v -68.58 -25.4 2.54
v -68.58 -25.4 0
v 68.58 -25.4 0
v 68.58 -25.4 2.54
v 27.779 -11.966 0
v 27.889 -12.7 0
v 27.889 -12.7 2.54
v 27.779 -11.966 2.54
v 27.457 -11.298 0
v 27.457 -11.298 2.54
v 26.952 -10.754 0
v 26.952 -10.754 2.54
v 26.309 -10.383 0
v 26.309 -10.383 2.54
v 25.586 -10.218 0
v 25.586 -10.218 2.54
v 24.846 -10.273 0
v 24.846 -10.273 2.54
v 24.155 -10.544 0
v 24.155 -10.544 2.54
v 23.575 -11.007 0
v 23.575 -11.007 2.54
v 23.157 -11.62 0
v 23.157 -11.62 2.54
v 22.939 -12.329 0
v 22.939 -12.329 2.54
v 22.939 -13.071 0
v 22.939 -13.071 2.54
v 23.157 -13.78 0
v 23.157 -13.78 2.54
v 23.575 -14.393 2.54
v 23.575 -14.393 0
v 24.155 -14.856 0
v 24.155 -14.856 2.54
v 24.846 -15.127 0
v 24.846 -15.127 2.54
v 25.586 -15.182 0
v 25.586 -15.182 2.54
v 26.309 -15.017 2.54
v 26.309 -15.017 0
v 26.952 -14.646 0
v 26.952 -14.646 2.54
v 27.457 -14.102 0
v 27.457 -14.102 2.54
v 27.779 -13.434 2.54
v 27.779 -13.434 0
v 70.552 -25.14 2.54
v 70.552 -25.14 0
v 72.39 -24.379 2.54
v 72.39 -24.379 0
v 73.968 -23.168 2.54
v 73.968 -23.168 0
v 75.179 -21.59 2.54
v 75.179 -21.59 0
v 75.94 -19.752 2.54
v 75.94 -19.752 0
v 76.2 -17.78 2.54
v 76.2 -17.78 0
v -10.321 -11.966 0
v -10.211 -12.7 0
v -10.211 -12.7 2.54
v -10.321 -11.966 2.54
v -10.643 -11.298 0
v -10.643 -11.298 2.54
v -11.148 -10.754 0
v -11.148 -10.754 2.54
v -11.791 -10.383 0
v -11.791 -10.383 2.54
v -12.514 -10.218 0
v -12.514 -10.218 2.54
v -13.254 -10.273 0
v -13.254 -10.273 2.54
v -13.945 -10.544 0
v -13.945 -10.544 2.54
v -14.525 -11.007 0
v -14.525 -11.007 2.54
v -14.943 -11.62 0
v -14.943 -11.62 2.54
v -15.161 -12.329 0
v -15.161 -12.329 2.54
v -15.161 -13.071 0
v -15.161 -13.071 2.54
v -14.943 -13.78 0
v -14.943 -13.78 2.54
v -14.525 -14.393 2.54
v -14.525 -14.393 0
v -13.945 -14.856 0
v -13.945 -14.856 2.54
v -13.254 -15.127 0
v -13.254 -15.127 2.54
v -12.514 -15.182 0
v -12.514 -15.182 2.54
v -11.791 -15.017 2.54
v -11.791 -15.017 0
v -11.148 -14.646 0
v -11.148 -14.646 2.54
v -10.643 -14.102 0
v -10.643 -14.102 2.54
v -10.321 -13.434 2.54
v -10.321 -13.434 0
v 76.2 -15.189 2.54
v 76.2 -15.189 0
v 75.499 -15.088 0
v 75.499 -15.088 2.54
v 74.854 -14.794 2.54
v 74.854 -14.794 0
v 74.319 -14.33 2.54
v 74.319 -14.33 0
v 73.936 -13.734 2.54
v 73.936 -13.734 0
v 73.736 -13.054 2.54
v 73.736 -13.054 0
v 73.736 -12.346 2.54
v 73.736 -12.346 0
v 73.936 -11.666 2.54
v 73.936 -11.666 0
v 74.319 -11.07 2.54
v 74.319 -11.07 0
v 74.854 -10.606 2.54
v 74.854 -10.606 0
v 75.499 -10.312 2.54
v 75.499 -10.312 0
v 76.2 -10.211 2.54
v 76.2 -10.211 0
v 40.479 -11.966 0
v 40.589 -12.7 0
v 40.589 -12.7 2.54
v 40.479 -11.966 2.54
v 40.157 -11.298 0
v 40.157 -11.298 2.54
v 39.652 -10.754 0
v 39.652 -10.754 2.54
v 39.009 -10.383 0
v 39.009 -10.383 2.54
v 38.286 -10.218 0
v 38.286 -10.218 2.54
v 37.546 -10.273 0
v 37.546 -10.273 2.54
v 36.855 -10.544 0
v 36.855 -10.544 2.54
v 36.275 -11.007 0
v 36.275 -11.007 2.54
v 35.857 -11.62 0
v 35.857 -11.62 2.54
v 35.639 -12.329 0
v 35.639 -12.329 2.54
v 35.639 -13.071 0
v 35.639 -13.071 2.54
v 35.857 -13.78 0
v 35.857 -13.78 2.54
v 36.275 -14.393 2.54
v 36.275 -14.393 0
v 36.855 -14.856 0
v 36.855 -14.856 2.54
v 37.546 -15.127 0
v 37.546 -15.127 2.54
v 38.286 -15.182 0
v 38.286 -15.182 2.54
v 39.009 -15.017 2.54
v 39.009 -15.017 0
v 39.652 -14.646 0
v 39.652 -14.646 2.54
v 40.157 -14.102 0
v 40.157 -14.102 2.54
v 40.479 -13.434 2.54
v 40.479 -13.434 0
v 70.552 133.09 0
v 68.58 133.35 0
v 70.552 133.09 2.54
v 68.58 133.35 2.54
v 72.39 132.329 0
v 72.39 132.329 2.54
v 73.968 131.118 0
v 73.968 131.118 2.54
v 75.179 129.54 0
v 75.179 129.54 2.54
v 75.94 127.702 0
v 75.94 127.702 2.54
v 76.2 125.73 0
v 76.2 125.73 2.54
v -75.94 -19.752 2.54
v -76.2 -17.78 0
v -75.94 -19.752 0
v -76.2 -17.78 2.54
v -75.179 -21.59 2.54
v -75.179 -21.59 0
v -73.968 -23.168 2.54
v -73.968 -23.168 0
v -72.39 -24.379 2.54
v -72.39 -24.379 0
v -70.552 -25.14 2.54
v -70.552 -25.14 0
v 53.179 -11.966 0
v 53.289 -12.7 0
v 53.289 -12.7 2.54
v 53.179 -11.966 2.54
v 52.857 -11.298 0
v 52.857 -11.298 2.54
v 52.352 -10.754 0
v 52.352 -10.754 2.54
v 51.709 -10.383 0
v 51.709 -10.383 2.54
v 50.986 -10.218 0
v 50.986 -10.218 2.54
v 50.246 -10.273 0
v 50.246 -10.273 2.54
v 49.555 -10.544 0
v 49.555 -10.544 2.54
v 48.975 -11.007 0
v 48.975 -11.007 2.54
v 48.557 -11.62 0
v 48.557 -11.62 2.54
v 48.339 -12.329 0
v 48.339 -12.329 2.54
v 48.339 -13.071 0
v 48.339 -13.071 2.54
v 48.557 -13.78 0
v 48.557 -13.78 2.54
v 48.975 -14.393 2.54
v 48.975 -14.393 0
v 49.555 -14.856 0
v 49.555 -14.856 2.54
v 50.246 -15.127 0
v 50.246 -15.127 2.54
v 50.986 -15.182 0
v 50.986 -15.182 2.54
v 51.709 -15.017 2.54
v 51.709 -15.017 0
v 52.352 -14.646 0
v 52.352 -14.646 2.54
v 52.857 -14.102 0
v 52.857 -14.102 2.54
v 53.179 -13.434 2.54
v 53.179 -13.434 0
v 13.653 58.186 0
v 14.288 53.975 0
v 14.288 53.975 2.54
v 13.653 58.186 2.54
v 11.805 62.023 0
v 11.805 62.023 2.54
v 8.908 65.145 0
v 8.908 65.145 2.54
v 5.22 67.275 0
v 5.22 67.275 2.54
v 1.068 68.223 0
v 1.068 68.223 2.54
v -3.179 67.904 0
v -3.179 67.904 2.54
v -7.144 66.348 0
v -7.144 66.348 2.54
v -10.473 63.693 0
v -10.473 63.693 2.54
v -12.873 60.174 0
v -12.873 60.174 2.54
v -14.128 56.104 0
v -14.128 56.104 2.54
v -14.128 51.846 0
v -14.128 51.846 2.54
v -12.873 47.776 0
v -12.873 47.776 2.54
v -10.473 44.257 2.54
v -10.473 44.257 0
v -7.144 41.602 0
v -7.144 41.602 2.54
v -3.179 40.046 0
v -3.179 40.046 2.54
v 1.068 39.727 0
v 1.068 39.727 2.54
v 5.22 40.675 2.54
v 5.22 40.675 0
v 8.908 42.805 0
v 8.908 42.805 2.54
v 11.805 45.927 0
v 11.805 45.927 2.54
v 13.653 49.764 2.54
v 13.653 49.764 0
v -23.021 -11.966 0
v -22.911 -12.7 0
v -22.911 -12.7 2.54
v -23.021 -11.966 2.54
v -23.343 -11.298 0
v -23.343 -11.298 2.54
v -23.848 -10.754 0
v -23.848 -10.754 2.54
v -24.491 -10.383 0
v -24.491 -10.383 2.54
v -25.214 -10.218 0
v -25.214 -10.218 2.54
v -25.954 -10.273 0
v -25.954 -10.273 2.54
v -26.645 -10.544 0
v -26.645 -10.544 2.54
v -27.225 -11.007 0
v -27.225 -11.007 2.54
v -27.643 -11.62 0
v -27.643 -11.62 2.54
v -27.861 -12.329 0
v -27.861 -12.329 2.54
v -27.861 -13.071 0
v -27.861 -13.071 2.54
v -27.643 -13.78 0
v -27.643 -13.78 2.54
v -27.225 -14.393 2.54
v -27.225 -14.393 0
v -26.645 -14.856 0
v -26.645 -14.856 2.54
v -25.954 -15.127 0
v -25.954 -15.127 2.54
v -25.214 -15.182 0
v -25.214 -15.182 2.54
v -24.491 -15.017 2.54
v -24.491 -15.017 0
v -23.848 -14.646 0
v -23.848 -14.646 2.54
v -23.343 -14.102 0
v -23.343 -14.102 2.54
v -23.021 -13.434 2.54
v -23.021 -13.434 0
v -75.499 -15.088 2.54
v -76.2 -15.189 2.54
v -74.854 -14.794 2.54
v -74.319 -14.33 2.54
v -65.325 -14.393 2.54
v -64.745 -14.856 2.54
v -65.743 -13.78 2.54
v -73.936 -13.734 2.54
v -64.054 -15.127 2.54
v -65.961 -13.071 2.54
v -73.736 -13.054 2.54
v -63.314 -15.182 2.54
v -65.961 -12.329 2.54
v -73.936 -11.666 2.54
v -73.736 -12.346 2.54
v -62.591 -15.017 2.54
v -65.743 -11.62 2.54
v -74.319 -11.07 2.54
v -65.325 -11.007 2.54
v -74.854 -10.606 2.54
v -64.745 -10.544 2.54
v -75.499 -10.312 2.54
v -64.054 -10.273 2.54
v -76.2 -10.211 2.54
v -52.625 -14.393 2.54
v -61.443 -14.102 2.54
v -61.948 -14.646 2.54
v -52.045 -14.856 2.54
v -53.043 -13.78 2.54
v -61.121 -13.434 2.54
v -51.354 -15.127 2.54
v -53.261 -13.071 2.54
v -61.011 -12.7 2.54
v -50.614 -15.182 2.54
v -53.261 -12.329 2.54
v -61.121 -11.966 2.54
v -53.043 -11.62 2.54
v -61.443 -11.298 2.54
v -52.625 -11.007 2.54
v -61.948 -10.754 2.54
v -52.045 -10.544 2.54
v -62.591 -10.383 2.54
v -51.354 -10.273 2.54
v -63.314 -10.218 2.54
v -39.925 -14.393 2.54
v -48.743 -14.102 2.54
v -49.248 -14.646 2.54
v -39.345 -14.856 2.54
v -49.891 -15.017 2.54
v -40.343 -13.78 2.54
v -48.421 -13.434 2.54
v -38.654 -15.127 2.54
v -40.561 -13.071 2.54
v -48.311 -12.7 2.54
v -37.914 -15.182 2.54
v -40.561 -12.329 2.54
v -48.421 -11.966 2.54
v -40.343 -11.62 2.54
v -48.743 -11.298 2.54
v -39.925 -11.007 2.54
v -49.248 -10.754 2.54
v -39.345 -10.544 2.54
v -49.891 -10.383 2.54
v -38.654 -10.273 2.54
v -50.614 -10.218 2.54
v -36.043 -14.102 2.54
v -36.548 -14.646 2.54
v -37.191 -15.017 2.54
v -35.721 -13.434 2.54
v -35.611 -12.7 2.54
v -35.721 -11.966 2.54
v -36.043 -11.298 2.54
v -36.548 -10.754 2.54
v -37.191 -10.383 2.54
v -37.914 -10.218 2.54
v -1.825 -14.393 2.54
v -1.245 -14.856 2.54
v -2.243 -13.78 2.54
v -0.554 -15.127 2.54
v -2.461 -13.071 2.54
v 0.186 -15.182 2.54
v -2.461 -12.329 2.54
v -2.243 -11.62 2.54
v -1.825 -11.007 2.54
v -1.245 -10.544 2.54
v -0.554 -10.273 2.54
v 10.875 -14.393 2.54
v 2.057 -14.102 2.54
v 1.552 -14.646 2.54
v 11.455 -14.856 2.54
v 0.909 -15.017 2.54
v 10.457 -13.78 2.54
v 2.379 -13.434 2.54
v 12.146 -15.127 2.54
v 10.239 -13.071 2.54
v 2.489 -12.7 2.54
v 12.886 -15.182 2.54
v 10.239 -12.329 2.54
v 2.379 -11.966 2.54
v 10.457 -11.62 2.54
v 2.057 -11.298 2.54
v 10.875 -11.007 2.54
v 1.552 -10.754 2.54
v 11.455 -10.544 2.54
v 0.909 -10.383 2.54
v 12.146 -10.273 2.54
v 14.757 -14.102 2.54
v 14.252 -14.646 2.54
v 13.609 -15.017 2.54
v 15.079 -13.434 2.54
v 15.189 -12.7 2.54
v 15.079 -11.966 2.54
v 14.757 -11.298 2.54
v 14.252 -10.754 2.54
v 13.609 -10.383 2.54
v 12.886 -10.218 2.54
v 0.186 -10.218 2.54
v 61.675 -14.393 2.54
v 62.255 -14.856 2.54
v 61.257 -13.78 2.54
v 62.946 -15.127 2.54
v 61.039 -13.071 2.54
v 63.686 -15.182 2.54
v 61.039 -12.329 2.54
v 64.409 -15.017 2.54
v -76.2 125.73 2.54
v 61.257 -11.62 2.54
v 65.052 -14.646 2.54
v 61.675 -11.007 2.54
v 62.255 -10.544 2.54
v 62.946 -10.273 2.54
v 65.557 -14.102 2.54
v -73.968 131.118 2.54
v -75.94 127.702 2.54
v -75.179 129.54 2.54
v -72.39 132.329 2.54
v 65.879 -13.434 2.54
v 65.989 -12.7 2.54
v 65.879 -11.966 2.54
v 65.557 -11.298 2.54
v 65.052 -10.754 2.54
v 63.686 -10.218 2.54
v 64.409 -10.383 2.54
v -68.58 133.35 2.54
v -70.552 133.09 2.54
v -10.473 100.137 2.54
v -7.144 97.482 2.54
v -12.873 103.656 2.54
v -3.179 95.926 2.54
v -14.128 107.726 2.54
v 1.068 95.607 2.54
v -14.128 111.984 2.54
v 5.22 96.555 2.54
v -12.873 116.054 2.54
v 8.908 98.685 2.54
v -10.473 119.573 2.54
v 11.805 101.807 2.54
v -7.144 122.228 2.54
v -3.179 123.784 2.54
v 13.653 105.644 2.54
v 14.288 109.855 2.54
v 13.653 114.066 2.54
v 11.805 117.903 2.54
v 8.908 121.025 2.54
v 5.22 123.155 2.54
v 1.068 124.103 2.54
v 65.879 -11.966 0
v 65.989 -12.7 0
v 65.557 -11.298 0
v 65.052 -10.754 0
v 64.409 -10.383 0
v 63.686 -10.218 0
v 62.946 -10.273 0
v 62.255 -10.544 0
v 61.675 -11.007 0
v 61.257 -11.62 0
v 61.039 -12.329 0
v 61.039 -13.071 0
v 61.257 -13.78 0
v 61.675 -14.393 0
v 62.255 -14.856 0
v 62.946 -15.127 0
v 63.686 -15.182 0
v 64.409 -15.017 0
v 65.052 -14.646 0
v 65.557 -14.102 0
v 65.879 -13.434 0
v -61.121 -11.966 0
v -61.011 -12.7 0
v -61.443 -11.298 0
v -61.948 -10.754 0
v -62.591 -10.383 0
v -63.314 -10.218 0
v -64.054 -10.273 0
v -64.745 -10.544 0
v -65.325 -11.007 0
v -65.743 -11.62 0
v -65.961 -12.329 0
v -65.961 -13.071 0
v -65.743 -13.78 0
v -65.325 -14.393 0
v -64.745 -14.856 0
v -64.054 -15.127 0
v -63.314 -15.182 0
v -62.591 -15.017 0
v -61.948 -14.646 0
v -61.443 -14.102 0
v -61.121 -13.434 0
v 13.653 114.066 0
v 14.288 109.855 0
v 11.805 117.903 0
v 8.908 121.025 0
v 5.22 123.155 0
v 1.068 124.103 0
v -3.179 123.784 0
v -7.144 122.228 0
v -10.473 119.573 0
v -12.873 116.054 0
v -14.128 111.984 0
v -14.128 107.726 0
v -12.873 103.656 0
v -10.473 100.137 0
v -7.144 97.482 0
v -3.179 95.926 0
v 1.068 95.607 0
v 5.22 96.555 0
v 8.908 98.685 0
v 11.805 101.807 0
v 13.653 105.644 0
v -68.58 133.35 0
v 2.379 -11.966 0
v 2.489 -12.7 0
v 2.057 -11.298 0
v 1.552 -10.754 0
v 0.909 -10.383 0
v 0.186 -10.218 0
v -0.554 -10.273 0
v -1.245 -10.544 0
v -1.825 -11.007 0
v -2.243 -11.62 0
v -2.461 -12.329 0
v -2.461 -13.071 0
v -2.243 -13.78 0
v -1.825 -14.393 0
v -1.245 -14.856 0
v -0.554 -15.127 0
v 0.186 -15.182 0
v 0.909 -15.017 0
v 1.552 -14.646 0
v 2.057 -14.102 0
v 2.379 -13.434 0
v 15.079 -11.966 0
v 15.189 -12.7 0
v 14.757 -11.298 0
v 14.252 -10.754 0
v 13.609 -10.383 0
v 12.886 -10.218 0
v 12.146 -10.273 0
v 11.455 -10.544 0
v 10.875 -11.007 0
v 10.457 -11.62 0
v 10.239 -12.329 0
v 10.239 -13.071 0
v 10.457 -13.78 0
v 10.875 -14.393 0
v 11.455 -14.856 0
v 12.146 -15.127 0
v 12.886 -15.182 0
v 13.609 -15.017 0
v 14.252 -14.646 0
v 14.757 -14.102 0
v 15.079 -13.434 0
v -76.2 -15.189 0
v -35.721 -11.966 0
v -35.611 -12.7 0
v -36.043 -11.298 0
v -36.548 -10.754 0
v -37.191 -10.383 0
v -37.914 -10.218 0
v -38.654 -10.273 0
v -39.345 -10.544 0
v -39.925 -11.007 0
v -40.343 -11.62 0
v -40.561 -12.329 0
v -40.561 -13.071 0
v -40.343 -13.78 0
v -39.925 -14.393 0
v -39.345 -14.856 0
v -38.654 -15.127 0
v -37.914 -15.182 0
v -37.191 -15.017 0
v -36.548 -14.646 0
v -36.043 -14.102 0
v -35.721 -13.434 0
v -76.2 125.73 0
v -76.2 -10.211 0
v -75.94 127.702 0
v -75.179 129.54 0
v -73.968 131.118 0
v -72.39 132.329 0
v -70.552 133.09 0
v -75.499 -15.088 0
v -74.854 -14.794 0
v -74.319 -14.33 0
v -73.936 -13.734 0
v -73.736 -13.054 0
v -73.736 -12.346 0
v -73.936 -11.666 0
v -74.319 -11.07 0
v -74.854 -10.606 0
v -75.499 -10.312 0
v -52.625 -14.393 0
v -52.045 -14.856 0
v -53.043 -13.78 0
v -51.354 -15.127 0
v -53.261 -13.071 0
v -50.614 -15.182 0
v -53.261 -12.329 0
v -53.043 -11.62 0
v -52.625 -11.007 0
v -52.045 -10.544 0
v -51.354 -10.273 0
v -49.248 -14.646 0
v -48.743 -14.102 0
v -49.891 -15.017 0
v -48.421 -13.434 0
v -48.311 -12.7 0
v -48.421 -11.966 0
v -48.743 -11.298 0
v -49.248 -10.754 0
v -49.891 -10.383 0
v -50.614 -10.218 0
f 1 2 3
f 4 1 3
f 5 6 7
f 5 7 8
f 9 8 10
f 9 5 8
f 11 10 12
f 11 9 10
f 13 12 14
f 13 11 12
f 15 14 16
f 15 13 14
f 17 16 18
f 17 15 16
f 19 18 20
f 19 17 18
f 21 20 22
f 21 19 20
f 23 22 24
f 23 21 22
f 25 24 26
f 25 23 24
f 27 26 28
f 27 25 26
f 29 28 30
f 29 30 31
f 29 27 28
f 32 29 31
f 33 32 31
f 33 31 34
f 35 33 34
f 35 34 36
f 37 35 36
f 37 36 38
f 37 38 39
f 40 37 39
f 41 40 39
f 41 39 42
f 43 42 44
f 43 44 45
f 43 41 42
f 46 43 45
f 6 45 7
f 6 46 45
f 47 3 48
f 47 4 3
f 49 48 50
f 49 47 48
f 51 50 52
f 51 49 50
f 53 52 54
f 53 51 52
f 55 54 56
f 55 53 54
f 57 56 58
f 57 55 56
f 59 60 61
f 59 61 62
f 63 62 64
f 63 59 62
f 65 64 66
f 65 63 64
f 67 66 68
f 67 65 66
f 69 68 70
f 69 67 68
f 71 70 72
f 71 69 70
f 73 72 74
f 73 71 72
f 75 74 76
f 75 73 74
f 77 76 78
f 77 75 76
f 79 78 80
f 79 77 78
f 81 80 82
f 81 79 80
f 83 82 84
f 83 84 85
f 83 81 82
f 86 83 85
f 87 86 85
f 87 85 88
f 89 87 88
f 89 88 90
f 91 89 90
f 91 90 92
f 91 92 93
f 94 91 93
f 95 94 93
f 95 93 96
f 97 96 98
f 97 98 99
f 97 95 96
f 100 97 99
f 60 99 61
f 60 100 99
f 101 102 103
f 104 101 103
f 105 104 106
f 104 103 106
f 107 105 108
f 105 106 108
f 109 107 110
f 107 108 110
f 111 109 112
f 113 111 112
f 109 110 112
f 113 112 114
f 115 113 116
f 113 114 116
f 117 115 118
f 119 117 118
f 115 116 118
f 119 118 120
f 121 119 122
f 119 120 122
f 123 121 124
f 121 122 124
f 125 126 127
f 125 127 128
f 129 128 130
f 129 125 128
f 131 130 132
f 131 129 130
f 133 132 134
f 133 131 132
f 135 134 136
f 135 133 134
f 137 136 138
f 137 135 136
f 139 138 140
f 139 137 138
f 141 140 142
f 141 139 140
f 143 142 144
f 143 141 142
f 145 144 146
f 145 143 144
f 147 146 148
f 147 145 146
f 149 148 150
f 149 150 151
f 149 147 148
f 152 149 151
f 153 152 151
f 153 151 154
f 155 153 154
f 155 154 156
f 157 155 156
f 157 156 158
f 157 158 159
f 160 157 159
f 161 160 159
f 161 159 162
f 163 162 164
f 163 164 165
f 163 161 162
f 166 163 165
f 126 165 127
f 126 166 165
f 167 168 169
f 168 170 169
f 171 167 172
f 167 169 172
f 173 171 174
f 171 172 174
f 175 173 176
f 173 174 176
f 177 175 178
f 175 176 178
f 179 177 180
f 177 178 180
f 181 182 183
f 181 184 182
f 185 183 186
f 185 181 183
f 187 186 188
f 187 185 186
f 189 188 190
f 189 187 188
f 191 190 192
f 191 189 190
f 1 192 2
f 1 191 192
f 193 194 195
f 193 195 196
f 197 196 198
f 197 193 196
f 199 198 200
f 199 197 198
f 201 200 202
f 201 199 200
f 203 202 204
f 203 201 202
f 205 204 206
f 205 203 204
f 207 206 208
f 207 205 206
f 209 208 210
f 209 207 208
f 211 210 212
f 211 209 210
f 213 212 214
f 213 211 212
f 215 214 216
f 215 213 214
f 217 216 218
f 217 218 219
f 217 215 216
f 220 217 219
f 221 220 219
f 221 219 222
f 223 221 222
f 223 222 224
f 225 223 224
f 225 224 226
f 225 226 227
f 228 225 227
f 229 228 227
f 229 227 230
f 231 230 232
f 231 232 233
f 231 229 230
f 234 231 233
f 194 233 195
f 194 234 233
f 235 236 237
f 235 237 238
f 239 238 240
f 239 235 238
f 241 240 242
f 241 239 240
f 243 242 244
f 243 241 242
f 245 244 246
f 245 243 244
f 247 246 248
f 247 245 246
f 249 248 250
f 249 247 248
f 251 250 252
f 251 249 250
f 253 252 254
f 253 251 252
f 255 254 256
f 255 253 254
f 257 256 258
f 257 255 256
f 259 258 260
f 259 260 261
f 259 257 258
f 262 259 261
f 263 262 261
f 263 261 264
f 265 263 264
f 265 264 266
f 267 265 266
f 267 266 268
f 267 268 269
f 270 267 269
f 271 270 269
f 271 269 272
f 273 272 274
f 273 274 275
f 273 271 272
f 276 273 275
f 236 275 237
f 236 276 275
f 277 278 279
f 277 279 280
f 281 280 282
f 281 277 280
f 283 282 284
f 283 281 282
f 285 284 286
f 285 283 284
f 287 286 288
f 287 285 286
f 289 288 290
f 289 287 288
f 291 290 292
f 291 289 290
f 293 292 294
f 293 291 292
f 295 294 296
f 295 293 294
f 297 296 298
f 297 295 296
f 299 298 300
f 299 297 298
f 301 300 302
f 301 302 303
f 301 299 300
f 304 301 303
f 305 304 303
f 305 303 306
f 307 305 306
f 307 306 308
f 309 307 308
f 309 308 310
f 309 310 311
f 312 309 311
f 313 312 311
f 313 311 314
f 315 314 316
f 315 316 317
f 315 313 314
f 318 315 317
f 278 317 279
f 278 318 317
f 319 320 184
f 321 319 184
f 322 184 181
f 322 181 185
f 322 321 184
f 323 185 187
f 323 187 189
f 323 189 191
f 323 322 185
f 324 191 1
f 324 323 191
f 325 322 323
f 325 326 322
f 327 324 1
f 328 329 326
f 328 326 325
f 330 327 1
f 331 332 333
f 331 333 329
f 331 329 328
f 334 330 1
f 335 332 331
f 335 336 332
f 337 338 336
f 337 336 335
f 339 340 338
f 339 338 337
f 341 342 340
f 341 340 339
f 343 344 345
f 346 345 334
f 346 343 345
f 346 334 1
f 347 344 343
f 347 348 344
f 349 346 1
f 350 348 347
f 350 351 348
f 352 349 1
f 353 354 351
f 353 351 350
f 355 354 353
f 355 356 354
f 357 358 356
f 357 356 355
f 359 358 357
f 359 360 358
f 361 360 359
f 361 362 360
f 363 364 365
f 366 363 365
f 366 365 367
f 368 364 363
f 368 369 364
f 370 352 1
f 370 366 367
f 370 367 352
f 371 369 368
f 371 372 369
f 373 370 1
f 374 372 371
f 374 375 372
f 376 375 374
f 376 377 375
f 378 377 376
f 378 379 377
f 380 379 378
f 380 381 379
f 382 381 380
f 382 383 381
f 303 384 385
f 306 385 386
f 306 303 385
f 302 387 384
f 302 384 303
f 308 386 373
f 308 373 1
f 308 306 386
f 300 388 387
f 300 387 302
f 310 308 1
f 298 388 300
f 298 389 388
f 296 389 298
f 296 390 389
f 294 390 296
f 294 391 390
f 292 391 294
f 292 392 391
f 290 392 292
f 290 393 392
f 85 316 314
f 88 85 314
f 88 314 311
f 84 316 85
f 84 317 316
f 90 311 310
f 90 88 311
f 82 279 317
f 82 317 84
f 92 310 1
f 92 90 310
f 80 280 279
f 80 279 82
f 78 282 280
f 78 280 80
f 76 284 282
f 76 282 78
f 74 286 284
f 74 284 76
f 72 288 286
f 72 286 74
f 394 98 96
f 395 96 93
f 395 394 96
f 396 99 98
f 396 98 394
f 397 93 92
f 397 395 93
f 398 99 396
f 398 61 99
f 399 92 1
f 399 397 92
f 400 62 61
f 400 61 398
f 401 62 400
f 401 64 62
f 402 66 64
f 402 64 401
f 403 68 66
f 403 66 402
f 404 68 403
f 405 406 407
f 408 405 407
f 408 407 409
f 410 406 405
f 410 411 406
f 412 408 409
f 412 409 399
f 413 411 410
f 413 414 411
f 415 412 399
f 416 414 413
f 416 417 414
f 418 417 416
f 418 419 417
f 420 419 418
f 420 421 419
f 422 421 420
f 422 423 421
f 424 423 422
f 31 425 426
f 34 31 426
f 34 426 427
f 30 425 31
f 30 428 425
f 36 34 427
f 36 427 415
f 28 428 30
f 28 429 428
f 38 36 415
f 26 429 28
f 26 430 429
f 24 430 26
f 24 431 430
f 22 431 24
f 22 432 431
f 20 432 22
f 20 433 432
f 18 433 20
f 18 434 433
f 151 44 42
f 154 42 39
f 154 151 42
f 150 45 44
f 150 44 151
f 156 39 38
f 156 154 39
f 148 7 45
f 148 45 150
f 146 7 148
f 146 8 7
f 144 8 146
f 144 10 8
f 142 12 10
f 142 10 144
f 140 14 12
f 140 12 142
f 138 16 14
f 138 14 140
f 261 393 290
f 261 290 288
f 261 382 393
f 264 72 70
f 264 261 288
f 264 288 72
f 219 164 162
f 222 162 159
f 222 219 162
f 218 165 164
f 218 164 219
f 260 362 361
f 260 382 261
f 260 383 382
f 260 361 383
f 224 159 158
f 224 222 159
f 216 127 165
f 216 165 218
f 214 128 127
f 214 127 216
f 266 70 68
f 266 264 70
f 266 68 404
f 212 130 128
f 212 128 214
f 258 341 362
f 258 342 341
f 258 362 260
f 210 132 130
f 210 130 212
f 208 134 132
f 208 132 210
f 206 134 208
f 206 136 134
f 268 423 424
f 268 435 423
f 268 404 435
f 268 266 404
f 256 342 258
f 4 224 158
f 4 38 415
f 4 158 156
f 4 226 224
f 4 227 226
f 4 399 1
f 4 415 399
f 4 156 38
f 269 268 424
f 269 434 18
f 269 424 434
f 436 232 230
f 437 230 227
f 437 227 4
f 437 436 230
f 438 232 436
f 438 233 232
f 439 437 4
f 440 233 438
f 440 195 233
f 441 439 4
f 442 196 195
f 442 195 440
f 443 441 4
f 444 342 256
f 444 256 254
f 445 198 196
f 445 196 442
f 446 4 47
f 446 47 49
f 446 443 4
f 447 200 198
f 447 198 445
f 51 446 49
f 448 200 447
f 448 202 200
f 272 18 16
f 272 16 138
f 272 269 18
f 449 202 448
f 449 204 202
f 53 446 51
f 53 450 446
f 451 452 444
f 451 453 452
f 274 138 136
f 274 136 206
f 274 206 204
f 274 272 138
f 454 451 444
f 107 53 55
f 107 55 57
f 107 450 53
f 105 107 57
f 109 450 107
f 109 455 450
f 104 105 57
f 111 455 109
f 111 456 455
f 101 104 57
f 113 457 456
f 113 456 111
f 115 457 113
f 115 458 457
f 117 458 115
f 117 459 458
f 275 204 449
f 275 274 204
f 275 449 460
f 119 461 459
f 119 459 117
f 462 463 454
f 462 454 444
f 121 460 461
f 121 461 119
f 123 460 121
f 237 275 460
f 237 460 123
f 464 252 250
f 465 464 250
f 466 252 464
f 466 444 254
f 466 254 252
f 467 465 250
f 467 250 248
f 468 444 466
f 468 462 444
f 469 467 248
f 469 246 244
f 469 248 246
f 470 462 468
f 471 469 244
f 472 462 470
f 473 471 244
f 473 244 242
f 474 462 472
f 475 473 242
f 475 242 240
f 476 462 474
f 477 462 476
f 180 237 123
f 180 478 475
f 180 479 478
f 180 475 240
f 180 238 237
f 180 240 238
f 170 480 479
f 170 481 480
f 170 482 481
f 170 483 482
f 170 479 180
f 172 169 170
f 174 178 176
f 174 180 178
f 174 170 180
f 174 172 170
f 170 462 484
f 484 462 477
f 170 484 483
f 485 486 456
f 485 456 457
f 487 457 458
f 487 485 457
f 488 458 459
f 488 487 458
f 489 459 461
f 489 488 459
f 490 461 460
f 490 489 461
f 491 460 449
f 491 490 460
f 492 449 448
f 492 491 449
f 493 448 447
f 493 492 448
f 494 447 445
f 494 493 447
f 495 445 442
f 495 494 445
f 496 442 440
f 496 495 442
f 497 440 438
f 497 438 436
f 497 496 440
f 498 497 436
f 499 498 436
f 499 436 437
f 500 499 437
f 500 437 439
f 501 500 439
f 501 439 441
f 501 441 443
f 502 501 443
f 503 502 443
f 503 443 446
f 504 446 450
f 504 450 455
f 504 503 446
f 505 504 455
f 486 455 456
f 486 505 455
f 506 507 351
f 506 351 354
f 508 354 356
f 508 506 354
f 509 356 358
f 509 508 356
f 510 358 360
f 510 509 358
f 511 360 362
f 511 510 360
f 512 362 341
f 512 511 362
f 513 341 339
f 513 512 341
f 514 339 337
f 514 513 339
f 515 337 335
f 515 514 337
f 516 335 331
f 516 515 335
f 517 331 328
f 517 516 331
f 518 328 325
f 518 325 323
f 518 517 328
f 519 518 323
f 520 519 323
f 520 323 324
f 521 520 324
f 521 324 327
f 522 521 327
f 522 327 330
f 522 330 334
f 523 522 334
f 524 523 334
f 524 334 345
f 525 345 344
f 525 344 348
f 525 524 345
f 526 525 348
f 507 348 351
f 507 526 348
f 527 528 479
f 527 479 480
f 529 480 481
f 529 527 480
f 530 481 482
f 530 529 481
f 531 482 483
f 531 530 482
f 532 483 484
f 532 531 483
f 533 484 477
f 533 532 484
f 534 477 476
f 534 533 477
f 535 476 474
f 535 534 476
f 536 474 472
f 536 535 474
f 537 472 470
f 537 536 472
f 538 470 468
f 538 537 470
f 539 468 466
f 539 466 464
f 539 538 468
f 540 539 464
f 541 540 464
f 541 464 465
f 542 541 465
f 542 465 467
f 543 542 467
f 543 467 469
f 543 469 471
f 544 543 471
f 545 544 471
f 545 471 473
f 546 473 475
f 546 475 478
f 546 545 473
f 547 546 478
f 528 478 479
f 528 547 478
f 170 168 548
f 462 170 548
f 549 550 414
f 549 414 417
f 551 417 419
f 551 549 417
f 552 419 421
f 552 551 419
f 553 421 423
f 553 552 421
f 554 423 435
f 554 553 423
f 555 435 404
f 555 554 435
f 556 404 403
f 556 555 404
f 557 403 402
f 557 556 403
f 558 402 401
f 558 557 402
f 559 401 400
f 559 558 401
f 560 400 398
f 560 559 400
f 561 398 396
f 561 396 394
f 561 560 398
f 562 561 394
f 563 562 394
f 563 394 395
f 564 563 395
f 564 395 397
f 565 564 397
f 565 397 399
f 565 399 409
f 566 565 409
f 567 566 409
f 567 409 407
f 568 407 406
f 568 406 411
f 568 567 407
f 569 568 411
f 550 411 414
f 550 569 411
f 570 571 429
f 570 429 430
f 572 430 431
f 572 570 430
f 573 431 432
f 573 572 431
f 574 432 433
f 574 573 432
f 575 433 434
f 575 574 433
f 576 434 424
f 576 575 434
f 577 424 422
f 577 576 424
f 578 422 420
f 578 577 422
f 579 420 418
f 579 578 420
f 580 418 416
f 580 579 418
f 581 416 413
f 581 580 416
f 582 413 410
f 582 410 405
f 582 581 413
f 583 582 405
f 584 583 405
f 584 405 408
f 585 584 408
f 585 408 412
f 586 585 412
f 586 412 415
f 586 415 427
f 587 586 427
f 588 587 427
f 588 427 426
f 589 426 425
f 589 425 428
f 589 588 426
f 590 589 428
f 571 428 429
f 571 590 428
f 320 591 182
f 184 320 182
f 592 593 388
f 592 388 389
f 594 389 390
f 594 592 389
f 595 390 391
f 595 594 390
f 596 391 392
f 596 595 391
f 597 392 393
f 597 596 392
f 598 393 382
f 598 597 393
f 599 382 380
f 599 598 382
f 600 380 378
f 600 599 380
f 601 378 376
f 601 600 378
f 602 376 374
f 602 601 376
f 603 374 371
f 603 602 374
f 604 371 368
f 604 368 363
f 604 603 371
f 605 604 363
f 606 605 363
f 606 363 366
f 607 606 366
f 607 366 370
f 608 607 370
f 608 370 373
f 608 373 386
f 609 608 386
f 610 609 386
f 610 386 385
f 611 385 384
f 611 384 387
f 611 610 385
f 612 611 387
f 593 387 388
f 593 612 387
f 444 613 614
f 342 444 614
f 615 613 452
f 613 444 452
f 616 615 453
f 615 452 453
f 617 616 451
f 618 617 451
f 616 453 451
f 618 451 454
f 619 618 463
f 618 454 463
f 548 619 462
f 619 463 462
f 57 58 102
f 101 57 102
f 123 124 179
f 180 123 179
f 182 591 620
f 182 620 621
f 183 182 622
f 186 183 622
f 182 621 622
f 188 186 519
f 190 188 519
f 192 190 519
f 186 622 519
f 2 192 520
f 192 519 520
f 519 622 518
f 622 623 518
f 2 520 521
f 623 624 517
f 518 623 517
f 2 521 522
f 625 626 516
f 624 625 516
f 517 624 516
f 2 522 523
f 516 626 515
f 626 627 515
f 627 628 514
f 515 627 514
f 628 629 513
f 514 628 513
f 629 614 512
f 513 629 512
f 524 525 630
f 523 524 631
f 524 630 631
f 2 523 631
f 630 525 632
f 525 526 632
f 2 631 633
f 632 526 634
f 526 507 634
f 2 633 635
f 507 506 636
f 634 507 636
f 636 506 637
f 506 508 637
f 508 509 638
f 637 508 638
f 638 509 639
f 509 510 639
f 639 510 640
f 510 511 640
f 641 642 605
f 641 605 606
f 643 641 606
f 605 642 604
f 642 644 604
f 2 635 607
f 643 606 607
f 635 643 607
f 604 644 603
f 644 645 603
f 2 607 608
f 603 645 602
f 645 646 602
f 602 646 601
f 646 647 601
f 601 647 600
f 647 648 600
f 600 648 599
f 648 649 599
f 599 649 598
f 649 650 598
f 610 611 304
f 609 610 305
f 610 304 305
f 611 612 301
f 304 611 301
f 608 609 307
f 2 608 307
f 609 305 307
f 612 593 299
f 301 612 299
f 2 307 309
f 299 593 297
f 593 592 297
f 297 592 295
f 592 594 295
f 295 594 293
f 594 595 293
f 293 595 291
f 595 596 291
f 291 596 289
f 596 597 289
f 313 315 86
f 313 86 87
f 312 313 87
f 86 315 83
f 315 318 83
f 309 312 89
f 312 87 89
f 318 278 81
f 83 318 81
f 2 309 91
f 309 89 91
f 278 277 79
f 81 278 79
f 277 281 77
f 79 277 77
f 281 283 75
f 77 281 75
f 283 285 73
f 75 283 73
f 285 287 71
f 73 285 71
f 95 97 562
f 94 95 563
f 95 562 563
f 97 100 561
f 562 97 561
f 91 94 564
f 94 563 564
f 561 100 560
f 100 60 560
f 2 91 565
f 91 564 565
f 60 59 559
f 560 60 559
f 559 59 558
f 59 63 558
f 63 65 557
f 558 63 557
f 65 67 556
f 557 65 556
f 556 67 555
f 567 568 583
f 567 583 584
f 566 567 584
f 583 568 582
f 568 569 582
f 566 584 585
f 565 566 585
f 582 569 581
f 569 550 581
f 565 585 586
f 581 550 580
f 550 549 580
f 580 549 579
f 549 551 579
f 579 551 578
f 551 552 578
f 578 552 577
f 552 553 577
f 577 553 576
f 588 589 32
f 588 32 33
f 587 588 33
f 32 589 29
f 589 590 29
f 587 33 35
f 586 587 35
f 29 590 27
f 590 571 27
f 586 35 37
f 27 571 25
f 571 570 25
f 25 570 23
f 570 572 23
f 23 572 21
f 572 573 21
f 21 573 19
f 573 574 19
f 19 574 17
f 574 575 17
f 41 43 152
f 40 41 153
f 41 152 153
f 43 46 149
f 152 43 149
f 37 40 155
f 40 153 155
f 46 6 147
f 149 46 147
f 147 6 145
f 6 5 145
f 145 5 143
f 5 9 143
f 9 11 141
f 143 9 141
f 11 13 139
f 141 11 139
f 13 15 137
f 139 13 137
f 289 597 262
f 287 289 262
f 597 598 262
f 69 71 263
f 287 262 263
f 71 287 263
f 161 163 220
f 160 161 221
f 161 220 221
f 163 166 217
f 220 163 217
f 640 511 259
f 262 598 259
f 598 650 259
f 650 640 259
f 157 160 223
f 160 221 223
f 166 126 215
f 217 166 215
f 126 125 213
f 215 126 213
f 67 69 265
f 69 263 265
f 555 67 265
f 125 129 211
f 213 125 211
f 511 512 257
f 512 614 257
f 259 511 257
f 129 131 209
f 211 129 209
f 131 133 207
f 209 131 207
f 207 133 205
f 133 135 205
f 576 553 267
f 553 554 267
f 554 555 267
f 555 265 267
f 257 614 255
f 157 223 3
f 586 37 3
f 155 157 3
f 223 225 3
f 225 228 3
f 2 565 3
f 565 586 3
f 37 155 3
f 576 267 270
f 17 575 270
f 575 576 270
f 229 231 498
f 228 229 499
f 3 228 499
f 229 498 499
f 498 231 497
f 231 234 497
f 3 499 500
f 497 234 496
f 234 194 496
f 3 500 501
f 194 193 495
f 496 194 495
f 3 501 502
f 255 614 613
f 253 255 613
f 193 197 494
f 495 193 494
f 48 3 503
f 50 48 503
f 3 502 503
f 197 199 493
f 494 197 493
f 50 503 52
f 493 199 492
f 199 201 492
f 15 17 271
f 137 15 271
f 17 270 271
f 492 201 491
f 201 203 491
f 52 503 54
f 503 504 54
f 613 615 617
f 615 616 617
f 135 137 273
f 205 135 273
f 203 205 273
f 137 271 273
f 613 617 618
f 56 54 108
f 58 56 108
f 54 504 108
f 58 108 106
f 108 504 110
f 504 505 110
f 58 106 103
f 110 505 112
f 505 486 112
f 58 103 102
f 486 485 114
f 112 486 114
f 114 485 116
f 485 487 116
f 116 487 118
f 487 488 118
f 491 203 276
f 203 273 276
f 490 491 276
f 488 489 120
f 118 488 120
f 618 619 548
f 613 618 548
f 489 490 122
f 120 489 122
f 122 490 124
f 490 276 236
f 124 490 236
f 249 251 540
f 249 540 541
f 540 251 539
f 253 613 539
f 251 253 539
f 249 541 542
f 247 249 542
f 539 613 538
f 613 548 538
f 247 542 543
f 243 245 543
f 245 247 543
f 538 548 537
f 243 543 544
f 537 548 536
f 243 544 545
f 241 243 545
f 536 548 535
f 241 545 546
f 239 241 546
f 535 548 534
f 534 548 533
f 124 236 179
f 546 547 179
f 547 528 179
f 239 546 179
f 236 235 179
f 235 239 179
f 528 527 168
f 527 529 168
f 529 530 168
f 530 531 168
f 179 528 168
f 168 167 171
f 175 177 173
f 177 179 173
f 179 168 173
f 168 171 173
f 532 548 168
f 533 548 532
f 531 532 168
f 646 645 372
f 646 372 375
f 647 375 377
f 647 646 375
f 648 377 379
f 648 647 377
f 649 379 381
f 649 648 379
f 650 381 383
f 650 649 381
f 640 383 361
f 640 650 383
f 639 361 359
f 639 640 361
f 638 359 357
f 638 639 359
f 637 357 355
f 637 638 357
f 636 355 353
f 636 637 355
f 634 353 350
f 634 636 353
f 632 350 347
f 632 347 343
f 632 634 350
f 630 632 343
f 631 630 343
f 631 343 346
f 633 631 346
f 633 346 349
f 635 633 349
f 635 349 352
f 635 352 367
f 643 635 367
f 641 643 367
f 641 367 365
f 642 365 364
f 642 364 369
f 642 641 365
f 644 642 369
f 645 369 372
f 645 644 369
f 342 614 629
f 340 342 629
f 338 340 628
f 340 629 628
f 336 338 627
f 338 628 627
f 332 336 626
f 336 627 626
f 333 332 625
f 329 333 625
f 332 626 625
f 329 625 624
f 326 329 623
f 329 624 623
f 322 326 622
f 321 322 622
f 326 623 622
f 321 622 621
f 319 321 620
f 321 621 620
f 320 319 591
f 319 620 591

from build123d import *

# Parameters (mm, degrees)
SKETCH1_R           = 14.2875
SKETCH1_R_2         = 2.4892
BOSS_EXTRUDE1_DEPTH = 2.54
FILLET1_R           = 7.62


with BuildPart() as part:
    # Sketch1 → Boss-Extrude1 (new body)
    with BuildSketch(Plane.XY):
        with BuildLine():
            Line((-76.2, -15.1892), (-76.2, -25.4))
            Line((-76.2, -25.4), (76.2, -25.4))
            Line((76.2, -25.4), (76.2, -15.1892))
            ThreePointArc((76.2, -15.1892), (73.7108, -12.7), (76.2, -10.2108))
            Line((76.2, -10.2108), (76.2, 133.35))
            Line((76.2, 133.35), (-76.2, 133.35))
            Line((-76.2, 133.35), (-76.2, -10.2108))
            ThreePointArc((-76.2, -10.2108), (-73.7108, -12.7), (-76.2, -15.1892))
        make_face()
        with Locations((0, 53.975)):
            Circle(SKETCH1_R, mode=Mode.SUBTRACT)
        with Locations((-63.5, -12.7)):
            Circle(SKETCH1_R_2, mode=Mode.SUBTRACT)
        with Locations((-50.8, -12.7)):
            Circle(SKETCH1_R_2, mode=Mode.SUBTRACT)
        with Locations((-38.1, -12.7)):
            Circle(SKETCH1_R_2, mode=Mode.SUBTRACT)
        with Locations((-25.4, -12.7)):
            Circle(SKETCH1_R_2, mode=Mode.SUBTRACT)
        with Locations((-12.7, -12.7)):
            Circle(SKETCH1_R_2, mode=Mode.SUBTRACT)
        with Locations((0, -12.7)):
            Circle(SKETCH1_R_2, mode=Mode.SUBTRACT)
        with Locations((12.7, -12.7)):
            Circle(SKETCH1_R_2, mode=Mode.SUBTRACT)
        with Locations((25.4, -12.7)):
            Circle(SKETCH1_R_2, mode=Mode.SUBTRACT)
        with Locations((38.1, -12.7)):
            Circle(SKETCH1_R_2, mode=Mode.SUBTRACT)
        with Locations((50.8, -12.7)):
            Circle(SKETCH1_R_2, mode=Mode.SUBTRACT)
        with Locations((63.5, -12.7)):
            Circle(SKETCH1_R_2, mode=Mode.SUBTRACT)
        with Locations((0, 109.855)):
            Circle(SKETCH1_R, mode=Mode.SUBTRACT)
    extrude(amount=BOSS_EXTRUDE1_DEPTH)

    # Fillet1
    fillet1_edges = [part.edges().sort_by_distance(p)[0] for p in [
        (76.2, -25.4, 1.27),
        (-76.2, -25.4, 1.27),
        (-76.2, 133.35, 1.27),
        (76.2, 133.35, 1.27),
    ]]
    fillet(fillet1_edges, radius=FILLET1_R)


solid = part.part
